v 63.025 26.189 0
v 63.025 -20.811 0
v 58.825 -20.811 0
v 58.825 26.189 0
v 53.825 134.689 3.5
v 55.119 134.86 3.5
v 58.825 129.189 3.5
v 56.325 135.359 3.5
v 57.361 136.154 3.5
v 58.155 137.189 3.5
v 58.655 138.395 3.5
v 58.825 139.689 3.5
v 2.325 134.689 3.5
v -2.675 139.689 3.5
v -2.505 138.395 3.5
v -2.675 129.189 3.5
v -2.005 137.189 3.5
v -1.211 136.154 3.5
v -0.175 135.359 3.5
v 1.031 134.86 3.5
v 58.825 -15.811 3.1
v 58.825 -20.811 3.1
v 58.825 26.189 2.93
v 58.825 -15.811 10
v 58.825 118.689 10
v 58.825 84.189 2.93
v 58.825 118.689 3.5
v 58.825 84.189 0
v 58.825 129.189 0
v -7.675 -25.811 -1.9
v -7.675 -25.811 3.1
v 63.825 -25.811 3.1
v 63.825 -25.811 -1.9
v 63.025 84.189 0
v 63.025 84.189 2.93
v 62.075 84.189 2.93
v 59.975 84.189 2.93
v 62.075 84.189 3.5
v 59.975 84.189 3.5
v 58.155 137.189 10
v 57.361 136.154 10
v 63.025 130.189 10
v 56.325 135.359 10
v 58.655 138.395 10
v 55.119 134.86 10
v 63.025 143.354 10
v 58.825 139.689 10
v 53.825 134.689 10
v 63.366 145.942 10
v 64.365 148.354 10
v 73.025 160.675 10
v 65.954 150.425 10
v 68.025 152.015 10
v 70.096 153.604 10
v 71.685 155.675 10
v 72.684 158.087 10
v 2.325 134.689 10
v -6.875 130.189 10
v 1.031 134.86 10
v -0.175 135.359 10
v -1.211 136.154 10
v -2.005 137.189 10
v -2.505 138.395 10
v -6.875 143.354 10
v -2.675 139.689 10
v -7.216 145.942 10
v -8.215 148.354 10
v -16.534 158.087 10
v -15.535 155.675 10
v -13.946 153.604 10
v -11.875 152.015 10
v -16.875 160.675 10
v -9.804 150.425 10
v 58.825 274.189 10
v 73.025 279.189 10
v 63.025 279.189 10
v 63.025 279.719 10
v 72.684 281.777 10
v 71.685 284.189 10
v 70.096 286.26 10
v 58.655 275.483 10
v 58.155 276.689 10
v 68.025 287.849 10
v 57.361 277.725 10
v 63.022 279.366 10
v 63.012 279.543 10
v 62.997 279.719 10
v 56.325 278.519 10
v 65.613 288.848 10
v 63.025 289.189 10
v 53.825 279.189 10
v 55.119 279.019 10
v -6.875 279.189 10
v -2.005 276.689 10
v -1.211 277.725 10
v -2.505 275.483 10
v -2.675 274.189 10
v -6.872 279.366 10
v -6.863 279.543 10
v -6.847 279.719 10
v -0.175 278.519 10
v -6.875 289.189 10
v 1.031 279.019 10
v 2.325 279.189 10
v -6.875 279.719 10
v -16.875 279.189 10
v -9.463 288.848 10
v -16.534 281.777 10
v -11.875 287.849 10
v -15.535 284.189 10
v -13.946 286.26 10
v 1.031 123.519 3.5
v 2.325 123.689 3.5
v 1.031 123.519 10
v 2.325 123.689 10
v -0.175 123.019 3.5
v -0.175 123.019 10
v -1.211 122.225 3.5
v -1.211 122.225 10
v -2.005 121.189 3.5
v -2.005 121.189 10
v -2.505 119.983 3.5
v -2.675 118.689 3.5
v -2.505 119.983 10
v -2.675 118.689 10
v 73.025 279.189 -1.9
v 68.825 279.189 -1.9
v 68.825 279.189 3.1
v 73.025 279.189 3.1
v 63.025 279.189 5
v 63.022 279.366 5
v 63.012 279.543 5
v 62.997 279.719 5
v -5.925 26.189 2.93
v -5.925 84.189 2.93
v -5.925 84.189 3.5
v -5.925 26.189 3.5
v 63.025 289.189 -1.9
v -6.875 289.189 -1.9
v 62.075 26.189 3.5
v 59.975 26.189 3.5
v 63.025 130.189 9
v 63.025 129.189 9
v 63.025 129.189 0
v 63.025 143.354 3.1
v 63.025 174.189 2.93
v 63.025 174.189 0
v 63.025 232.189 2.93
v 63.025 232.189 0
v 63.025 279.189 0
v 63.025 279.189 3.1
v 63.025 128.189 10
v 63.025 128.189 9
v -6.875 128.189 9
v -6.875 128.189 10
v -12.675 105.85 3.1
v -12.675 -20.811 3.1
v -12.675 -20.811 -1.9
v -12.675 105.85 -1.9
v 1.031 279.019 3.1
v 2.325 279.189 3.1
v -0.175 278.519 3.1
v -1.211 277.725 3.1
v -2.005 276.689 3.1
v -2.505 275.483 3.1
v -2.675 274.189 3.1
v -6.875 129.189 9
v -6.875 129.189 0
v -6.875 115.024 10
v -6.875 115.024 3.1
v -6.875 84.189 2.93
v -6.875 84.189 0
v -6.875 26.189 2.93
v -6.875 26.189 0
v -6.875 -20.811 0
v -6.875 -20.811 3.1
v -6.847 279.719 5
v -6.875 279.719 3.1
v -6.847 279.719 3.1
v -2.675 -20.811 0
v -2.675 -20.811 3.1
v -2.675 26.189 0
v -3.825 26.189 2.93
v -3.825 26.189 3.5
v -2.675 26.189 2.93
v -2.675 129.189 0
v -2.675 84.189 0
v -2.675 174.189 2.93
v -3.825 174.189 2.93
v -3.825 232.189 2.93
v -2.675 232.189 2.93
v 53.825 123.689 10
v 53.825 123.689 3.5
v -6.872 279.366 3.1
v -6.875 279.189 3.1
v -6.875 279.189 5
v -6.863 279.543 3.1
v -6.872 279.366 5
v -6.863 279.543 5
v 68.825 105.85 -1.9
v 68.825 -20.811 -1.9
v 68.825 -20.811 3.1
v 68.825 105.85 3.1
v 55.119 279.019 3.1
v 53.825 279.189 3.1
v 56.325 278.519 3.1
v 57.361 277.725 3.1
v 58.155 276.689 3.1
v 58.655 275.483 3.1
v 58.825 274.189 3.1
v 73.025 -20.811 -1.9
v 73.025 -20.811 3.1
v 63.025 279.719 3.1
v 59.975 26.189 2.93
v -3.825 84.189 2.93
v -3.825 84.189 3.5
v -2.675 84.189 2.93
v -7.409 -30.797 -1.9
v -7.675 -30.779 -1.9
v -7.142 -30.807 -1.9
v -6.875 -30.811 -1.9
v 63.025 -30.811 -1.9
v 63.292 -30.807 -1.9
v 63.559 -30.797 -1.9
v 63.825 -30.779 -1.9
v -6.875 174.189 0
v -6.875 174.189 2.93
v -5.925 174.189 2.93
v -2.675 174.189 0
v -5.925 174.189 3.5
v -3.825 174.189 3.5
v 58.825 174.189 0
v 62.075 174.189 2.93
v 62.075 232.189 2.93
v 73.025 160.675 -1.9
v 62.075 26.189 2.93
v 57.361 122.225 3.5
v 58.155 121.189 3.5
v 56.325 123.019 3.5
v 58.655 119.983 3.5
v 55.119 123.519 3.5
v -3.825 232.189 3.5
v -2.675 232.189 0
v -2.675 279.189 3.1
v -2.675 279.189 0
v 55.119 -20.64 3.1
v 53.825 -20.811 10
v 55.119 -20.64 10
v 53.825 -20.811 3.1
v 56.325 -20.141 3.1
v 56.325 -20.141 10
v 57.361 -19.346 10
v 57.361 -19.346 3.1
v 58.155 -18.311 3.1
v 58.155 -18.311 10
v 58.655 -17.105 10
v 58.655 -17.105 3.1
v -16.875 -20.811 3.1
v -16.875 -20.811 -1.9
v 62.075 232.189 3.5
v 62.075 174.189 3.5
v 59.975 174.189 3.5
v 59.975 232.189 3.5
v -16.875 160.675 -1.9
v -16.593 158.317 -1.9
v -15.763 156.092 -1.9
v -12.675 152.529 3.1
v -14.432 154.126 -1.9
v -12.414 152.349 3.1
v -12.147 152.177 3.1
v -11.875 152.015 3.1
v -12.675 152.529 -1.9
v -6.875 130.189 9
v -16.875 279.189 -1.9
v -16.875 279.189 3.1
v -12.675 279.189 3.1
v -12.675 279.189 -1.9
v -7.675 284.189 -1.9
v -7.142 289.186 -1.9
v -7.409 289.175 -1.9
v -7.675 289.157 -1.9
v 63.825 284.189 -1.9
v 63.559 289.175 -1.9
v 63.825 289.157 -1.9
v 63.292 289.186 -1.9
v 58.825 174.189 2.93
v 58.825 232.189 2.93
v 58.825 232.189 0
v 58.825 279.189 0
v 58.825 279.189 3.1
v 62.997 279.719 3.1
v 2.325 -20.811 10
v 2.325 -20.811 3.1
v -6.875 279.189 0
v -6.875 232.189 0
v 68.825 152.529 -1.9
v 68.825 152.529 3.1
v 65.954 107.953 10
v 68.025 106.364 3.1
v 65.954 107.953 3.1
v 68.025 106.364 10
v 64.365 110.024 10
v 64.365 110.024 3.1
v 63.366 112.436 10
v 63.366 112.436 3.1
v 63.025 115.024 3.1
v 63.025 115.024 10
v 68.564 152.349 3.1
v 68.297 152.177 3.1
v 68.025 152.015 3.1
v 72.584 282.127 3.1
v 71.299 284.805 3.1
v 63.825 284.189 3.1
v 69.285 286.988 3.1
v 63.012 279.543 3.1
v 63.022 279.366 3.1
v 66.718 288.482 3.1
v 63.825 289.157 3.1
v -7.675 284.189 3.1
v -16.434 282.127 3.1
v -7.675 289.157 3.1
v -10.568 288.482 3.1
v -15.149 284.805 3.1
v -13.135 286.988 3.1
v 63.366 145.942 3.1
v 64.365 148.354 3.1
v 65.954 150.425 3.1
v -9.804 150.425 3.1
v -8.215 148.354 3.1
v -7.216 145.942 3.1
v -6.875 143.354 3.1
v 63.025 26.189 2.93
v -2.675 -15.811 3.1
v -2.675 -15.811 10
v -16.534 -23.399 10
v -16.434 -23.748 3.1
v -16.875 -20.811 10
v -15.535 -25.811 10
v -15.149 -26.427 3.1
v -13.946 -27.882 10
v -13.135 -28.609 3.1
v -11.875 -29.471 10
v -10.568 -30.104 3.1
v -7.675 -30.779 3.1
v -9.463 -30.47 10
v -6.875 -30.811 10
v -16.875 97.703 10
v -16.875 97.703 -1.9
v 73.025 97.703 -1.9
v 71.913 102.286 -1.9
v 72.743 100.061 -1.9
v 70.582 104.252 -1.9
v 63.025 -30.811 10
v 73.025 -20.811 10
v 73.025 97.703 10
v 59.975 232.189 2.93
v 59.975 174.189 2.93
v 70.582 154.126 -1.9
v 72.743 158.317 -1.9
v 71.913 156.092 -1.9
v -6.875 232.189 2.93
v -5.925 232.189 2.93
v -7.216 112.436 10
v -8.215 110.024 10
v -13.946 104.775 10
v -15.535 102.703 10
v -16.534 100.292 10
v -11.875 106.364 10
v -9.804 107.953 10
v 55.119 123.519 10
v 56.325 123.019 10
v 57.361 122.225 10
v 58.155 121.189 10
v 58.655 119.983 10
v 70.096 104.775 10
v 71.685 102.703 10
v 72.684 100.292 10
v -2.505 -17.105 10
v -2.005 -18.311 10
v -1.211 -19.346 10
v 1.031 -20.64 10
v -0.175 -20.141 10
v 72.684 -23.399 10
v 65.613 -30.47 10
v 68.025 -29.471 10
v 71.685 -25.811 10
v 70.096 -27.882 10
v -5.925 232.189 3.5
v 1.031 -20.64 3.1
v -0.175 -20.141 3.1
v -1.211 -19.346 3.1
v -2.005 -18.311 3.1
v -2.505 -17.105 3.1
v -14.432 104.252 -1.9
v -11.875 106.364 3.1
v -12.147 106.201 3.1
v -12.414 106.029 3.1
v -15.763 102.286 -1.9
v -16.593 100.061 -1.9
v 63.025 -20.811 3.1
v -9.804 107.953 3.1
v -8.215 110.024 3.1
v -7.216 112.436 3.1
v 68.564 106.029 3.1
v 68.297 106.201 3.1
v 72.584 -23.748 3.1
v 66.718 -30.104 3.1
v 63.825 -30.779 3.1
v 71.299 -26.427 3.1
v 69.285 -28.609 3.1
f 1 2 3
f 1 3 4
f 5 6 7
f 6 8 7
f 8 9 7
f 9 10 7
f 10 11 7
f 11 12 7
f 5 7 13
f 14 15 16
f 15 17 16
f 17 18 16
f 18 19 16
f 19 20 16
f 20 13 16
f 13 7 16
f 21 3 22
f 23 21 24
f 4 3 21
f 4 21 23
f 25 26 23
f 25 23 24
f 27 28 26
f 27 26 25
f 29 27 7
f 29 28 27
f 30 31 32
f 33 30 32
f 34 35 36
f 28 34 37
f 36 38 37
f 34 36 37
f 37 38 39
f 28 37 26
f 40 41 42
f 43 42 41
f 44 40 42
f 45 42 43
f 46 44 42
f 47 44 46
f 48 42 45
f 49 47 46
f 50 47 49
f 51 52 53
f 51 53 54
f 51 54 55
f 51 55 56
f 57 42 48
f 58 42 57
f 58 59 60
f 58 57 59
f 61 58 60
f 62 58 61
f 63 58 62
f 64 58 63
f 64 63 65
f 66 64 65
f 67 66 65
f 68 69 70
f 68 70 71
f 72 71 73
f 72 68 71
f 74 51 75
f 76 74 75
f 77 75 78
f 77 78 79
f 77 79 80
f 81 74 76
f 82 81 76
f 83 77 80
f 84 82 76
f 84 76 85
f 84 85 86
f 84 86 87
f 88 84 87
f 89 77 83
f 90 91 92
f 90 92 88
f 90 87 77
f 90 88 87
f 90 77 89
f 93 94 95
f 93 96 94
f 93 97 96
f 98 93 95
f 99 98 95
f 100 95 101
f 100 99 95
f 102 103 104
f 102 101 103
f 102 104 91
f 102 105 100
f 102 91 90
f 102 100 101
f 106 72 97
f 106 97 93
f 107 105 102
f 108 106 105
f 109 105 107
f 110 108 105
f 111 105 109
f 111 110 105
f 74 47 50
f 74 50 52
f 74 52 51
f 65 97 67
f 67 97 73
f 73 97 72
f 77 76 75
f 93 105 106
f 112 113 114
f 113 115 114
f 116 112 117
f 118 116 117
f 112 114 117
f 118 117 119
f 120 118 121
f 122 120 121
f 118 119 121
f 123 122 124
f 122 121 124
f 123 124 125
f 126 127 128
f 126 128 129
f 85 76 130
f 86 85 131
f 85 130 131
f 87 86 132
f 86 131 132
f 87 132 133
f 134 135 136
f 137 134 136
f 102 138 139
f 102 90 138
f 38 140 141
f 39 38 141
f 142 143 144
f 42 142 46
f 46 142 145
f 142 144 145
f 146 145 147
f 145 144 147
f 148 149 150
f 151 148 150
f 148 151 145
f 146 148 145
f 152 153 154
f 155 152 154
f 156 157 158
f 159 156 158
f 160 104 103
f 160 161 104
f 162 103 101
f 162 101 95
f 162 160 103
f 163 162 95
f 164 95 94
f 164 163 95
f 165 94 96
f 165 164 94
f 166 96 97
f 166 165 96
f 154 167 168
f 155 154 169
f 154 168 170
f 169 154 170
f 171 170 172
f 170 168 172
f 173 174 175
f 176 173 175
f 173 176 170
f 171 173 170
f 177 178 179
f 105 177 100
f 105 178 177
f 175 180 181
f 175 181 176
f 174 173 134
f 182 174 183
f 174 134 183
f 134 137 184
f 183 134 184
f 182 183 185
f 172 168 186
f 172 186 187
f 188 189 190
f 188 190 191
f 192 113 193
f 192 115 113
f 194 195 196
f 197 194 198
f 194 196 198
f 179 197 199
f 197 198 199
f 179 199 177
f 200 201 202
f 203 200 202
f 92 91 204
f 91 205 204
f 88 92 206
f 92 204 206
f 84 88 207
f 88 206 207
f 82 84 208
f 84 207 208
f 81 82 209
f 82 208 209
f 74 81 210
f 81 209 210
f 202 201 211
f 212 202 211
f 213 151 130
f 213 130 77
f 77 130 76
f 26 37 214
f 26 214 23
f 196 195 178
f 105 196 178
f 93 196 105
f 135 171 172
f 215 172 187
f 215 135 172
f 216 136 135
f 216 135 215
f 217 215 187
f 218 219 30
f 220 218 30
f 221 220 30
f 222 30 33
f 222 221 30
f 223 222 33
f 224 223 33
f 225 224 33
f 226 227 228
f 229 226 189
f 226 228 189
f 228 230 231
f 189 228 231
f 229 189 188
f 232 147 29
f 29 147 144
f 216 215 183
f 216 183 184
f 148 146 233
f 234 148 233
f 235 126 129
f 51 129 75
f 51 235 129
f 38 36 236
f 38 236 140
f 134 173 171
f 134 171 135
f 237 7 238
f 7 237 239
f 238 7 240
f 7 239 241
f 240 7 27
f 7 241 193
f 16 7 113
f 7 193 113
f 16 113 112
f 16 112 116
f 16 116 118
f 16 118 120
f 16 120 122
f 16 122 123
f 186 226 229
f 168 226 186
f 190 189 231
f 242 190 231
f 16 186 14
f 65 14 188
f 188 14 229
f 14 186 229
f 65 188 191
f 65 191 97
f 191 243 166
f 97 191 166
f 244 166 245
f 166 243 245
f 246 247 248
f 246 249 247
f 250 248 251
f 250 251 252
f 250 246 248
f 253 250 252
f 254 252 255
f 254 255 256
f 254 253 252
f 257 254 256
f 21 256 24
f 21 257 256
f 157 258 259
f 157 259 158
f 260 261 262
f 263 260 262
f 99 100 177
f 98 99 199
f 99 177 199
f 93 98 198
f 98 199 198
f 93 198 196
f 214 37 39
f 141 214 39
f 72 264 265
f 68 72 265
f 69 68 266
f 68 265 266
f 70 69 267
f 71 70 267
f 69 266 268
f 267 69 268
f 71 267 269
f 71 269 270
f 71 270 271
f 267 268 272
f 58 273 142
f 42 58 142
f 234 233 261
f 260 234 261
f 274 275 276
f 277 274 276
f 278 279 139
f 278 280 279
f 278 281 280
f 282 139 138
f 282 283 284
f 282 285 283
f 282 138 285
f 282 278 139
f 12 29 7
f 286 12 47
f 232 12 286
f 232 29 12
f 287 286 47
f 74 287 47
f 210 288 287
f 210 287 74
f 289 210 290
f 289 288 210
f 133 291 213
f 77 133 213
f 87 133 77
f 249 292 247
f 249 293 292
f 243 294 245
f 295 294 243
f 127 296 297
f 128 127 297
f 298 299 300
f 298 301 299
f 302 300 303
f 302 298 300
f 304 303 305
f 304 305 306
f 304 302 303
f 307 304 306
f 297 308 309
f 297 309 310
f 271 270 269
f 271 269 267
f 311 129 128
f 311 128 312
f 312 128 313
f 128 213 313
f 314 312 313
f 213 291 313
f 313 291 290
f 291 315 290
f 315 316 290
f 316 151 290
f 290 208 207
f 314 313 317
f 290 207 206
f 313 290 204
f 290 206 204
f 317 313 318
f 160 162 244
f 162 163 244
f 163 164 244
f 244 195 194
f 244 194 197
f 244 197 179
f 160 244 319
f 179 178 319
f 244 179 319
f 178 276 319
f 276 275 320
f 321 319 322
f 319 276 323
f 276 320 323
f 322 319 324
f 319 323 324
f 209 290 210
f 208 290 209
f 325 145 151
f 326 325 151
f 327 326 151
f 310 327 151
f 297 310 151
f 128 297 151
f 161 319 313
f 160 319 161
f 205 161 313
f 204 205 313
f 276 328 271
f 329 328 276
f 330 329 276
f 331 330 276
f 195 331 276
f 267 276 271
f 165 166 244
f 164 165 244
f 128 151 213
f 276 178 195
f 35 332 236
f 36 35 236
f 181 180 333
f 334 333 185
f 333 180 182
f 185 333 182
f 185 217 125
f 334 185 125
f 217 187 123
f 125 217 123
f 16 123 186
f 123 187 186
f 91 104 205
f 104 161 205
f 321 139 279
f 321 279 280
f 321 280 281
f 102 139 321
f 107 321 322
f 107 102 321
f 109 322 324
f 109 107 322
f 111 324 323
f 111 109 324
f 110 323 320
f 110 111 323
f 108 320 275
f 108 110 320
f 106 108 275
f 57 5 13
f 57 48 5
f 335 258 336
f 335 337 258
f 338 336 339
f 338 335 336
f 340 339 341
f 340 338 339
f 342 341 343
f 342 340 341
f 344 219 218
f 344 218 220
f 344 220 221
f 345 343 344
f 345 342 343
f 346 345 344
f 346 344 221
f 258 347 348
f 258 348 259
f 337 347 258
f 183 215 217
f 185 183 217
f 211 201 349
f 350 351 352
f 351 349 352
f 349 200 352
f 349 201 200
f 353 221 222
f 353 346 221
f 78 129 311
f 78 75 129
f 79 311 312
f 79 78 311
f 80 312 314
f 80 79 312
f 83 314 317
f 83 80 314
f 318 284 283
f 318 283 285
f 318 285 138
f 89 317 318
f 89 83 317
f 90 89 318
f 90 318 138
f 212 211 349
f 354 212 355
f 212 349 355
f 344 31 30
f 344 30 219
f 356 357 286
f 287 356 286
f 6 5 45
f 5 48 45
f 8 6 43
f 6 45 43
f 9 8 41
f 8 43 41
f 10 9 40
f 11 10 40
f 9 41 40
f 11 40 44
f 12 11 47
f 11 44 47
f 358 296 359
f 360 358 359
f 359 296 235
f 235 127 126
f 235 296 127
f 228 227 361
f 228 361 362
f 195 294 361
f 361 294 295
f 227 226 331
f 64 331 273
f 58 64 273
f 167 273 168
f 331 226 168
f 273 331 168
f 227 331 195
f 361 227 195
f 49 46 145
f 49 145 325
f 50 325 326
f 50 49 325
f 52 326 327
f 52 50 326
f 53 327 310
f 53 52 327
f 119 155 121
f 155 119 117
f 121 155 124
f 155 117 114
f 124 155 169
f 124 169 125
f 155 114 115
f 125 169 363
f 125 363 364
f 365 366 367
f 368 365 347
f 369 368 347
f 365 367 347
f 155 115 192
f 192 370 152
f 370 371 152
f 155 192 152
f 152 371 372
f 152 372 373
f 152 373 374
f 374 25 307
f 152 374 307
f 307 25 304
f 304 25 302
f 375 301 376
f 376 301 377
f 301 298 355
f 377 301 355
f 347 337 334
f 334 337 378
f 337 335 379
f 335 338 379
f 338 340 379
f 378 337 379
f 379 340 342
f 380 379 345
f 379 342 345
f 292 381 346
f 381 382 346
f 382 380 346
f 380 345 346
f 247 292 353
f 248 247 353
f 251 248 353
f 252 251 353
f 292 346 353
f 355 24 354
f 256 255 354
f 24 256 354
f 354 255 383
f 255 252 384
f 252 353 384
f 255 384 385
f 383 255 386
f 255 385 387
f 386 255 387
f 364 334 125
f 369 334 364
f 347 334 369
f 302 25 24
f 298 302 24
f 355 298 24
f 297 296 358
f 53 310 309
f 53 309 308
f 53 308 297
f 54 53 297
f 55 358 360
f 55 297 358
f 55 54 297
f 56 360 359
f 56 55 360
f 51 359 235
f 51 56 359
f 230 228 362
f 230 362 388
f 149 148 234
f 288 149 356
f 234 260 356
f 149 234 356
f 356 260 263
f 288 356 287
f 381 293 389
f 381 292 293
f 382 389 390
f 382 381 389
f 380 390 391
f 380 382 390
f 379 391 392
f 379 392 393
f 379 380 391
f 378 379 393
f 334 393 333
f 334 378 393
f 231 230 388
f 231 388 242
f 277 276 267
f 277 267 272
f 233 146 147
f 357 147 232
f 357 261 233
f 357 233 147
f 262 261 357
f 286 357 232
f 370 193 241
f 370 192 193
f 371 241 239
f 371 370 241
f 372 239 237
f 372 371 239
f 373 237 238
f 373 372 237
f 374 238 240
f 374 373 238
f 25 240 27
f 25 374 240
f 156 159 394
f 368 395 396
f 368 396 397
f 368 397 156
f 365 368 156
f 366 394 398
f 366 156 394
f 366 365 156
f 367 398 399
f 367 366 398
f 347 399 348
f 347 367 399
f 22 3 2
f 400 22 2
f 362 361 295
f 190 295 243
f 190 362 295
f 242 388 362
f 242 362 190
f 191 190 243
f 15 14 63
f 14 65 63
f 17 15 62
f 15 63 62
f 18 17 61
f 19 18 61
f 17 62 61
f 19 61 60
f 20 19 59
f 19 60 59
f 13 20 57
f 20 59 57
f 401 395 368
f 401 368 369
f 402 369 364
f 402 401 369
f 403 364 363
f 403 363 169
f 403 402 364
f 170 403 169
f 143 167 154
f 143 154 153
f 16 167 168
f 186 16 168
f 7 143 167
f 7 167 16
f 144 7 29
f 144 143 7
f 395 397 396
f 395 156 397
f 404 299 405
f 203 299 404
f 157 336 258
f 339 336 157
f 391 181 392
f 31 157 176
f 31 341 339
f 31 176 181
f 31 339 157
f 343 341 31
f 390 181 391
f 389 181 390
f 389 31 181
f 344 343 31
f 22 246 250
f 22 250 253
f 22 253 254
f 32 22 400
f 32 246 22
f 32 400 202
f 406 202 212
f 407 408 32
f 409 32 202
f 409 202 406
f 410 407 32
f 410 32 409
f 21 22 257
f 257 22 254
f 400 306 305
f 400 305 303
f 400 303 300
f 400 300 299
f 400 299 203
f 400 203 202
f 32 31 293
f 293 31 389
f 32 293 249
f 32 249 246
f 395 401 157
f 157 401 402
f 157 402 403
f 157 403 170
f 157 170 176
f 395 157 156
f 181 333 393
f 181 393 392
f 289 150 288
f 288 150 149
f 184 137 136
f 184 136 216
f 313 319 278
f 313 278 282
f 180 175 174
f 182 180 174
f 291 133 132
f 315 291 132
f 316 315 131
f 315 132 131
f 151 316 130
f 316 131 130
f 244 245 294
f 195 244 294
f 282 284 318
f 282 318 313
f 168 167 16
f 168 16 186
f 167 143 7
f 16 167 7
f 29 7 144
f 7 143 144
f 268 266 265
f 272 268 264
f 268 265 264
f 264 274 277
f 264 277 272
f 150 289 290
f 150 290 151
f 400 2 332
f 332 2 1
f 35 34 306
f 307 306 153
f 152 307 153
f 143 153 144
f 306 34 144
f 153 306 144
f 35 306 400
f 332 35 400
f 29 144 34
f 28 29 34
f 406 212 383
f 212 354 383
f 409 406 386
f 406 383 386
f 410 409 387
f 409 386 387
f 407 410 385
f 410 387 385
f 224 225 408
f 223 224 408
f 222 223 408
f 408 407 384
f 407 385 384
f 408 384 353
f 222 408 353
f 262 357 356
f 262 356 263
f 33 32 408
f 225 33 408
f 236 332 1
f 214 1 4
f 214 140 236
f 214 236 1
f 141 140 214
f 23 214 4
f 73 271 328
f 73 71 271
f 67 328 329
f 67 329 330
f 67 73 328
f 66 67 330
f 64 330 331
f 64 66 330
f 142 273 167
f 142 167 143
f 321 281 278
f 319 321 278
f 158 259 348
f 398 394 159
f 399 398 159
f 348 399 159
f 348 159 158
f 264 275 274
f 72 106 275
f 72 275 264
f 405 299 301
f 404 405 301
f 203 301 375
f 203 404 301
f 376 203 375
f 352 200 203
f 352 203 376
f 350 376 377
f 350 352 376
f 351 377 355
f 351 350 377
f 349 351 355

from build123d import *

# Parameters (mm, degrees)
SKETCH1_W            = 300
SKETCH1_H            = 4.2
BOSS_EXTRUDE1_DEPTH  = 5
SKETCH3_W            = 4.2
SKETCH3_H            = 58
CUT_EXTRUDE1_DEPTH   = 280.318535117
SKETCH4_W            = 2.1
SKETCH4_H            = 1.5
SKETCH4_W_2          = 1.15
SKETCH4_H_2          = 0.57
BOSS_EXTRUDE2_DEPTH  = 58
SKETCH5_W            = 4.2
SKETCH5_H            = 1.9
BOSS_EXTRUDE3_DEPTH  = 5
SKETCH6_W            = 5
SKETCH6_H            = 1.9
BOSS_EXTRUDE4_DEPTH  = 63
SKETCH7_W            = 5
SKETCH7_H            = 1.9
BOSS_EXTRUDE5_DEPTH  = 63
SKETCH8_W            = 5
SKETCH8_H            = 1.5
BOSS_EXTRUDE6_DEPTH  = 63
FILLET1_R            = 5
SKETCH9_W            = 69.9
SKETCH9_H            = 2
CUT_EXTRUDE2_DEPTH   = 1
SKETCH11_W           = 61.5
SKETCH11_H           = 147.5
BOSS_EXTRUDE8_DEPTH  = 5
SKETCH12_W           = 69.9
SKETCH12_H           = 2
BOSS_EXTRUDE9_DEPTH  = 5
SKETCH13_W           = 61.5
SKETCH13_H           = 147.5
BOSS_EXTRUDE10_DEPTH = 5
SKETCH15_W           = 125.83484861
SKETCH15_H           = 6.9
BOSS_EXTRUDE11_DEPTH = 10
SKETCH16_W           = 125.83484861
SKETCH16_H           = 6.9
BOSS_EXTRUDE12_DEPTH = 10
SKETCH17_W           = 10
SKETCH17_H           = 6.9
BOSS_EXTRUDE13_DEPTH = 5
BOSS_EXTRUDE14_REACH = 297.377
SKETCH18_W           = 4.47029548
SKETCH18_H           = 6.9
SKETCH19_W           = 10
SKETCH19_H           = 6.9
BOSS_EXTRUDE15_DEPTH = 5
SKETCH20_W           = 5
SKETCH20_H           = 6.9
BOSS_EXTRUDE16_DEPTH = 79.9
SKETCH21_W           = 89.9
SKETCH21_H           = 6.9
BOSS_EXTRUDE17_DEPTH = 5
SKETCH22_W           = 89.9
SKETCH22_H           = 6.9
BOSS_EXTRUDE18_DEPTH = 5
SKETCH23_W           = 4.2
SKETCH23_H           = 125.83484861
SKETCH23_W_2         = 71.5
SKETCH23_H_2         = 5
BOSS_EXTRUDE19_DEPTH = 5
SKETCH24_W           = 4.2
SKETCH24_H           = 125.83484861
SKETCH24_W_2         = 71.5
SKETCH24_H_2         = 5
BOSS_EXTRUDE20_DEPTH = 5
FILLET2_R            = 10
FILLET3_R            = 10
FILLET4_R            = 10
SKETCH25_W           = 61.5
SKETCH25_H           = 6.5
BOSS_EXTRUDE21_DEPTH = 3
SKETCH26_W           = 61.5
SKETCH26_H           = 6.5
BOSS_EXTRUDE22_DEPTH = 3
FILLET5_R            = 5


with BuildPart() as part:
    # Sketch1 → Boss-Extrude1 (new body)
    with BuildSketch(Plane(origin=(0, 0, 0), x_dir=(0, 1, 0), z_dir=(0, 0, 1))):
        with Locations((129.189144184, 4.775014868)):
            Rectangle(SKETCH1_W, SKETCH1_H)
    extrude(amount=BOSS_EXTRUDE1_DEPTH)

    # Sketch3 → Cut-Extrude1 (cut, through all)
    with BuildSketch(Plane.XY.offset(5)):
        with Locations((-4.775014868, 55.189144184)):
            Rectangle(SKETCH3_W, SKETCH3_H)
    extrude(amount=-CUT_EXTRUDE1_DEPTH, mode=Mode.SUBTRACT)


with BuildPart() as cut_extrude1_piece_1:
    # of the separate pieces the step leaves, piece 1, a body of its own (cut_extrude1_pieces)
    add(part.part.solids().sort_by_distance((-6.875014868, 84.189144184, 0))[0])



with BuildPart() as cut_extrude1_piece_2:
    # of the separate pieces the step leaves, piece 2, a body of its own (cut_extrude1_pieces)
    add(part.part.solids().sort_by_distance((-6.875014868, -20.810855816, 0))[0])


with BuildPart() as cut_extrude1_piece_1_1:
    add(cut_extrude1_piece_1.part)

    add(cut_extrude1_piece_2.part)  # Boss-Extrude2 merges Cut-Extrude1 piece 2
    # Sketch4 → Boss-Extrude2 (add)
    with BuildSketch(Plane.XZ.offset(-84.189144184)):
        Polygon((-5.925014868, 5), (-6.875014868, 5), (-6.875014868, 2.93), (-5.925014868, 2.93), (-5.925014868, 3.5), align=None)
        with Locations((-4.875014868, 4.25)):
            Rectangle(SKETCH4_W, SKETCH4_H)
        with Locations((-3.250014868, 4.25)):
            Rectangle(SKETCH4_W_2, SKETCH4_H)
        with Locations((-3.250014868, 3.215)):
            Rectangle(SKETCH4_W_2, SKETCH4_H_2)
    extrude(amount=BOSS_EXTRUDE2_DEPTH)

    # Split1
    split(bisect_by=Plane(origin=(0, 129.189144184, 0), x_dir=(1, 0, 0), z_dir=(0, 1, 0)), keep=Keep.BOTTOM)

    # Sketch5 → Boss-Extrude3 (add)
    with BuildSketch(Plane.XZ.offset(20.810855816)):
        with Locations((-4.775014868, 4.05)):
            Rectangle(SKETCH5_W, SKETCH5_H)
    extrude(amount=BOSS_EXTRUDE3_DEPTH)

    # Mirror1: Cut-Extrude1 piece 1 across plane


with BuildPart() as cut_extrude1_piece_1_2:
    add(cut_extrude1_piece_1_1.part)
    add(cut_extrude1_piece_1_1.part.mirror(Plane.ZX.offset(129.189144184)))


with BuildPart() as body_2:
    # Mirror4: mirrored copy
    add(cut_extrude1_piece_1_2.part.mirror(Plane.ZY.offset(-28.074985132)))


with BuildPart() as cut_extrude1_piece_1_3:
    add(cut_extrude1_piece_1_2.part)

    add(body_2.part)  # Boss-Extrude4 merges body 2
    # Sketch6 → Boss-Extrude4 (add)
    with BuildSketch(Plane.YZ.offset(-2.675014868)):
        with Locations((-23.310855816, 4.05)):
            Rectangle(SKETCH6_W, SKETCH6_H)
    extrude(amount=BOSS_EXTRUDE4_DEPTH)

    # Sketch7 → Boss-Extrude5 (add)
    with BuildSketch(Plane.YZ.offset(-2.675014868)):
        with Locations((281.689144184, 4.05)):
            Rectangle(SKETCH7_W, SKETCH7_H)
    extrude(amount=BOSS_EXTRUDE5_DEPTH)

    # Sketch8 → Boss-Extrude6 (add)
    with BuildSketch(Plane.YZ.offset(-2.675014868)):
        with Locations((129.189144184, 4.25)):
            Rectangle(SKETCH8_W, SKETCH8_H)
    extrude(amount=BOSS_EXTRUDE6_DEPTH)

    # Fillet1
    fillet1_edges = [cut_extrude1_piece_1_3.edges().sort_by_distance(p)[0] for p in [
        (63.024985132, 284.189144184, 4.05),
        (-6.875014868, -25.810855816, 4.05),
        (-6.875014868, 284.189144184, 4.05),
        (63.024985132, -25.810855816, 4.05),
    ]]
    fillet(fillet1_edges, radius=FILLET1_R)

    # Sketch9 → Cut-Extrude2 (cut)
    with BuildSketch(Plane.XY.offset(5)):
        with Locations((28.074985132, 129.189144184)):
            Rectangle(SKETCH9_W, SKETCH9_H)
    extrude(amount=-CUT_EXTRUDE2_DEPTH, mode=Mode.SUBTRACT)

    # Sketch11 → Boss-Extrude8 (add)
    with BuildSketch(Plane.XY.offset(5)):
        with BuildLine():
            Line((58.024985132, 284.189144184), (-1.875014868, 284.189144184))
            ThreePointArc((-1.875014868, 284.189144184), (-5.410548774, 282.72467809), (-6.875014868, 279.189144184))
            Line((-6.875014868, 279.189144184), (-6.875014868, 130.189144184))
            Line((-6.875014868, 130.189144184), (63.024985132, 130.189144184))
            Line((63.024985132, 130.189144184), (63.024985132, 279.189144184))
            ThreePointArc((63.024985132, 279.189144184), (61.560519038, 282.72467809), (58.024985132, 284.189144184))
        make_face()
        with Locations((28.074985132, 205.439144184)):
            Rectangle(SKETCH11_W, SKETCH11_H, mode=Mode.SUBTRACT)
    extrude(amount=BOSS_EXTRUDE8_DEPTH)

    # Sketch12 → Boss-Extrude9 (add)
    with BuildSketch(Plane.XY.offset(4)):
        with Locations((28.074985132, 129.189144184)):
            Rectangle(SKETCH12_W, SKETCH12_H)
    extrude(amount=BOSS_EXTRUDE9_DEPTH)

    # Sketch13 → Boss-Extrude10 (add)
    with BuildSketch(Plane.XY.offset(5)):
        with BuildLine():
            Line((63.024985132, -20.810855816), (63.024985132, 128.189144184))
            Line((63.024985132, 128.189144184), (-6.875014868, 128.189144184))
            Line((-6.875014868, 128.189144184), (-6.875014868, -20.810855816))
            ThreePointArc((-6.875014868, -20.810855816), (-5.410548774, -24.346389722), (-1.875014868, -25.810855816))
            Line((-1.875014868, -25.810855816), (58.024985132, -25.810855816))
            ThreePointArc((58.024985132, -25.810855816), (61.560519038, -24.346389722), (63.024985132, -20.810855816))
        make_face()
        with Locations((28.074985132, 52.939144184)):
            Rectangle(SKETCH13_W, SKETCH13_H, mode=Mode.SUBTRACT)
    extrude(amount=BOSS_EXTRUDE10_DEPTH)

    # Sketch15 → Boss-Extrude11 (add)
    with BuildSketch(Plane.YZ.offset(63.024985132)):
        with Locations((216.271719879, 6.55)):
            Rectangle(SKETCH15_W, SKETCH15_H)
        with Locations((42.106568489, 6.55)):
            Rectangle(SKETCH15_W, SKETCH15_H)
    extrude(amount=BOSS_EXTRUDE11_DEPTH)

    # Sketch16 → Boss-Extrude12 (add)
    with BuildSketch(Plane(origin=(-6.875014868, 0, 0), x_dir=(0, -1, 0), z_dir=(-1, 0, 0))):
        with Locations((-216.271719879, 6.55)):
            Rectangle(SKETCH16_W, SKETCH16_H)
        with Locations((-42.106568489, 6.55)):
            Rectangle(SKETCH16_W, SKETCH16_H)
    extrude(amount=BOSS_EXTRUDE12_DEPTH)

    # Sketch17 → Boss-Extrude13 (add)
    with BuildSketch(Plane(origin=(0, 279.189144184, 0), x_dir=(-1, 0, 0), z_dir=(0, 1, 0))):
        with Locations((11.875014868, 6.55)):
            Rectangle(SKETCH17_W, SKETCH17_H)
        with Locations((-68.024985132, 6.55)):
            Rectangle(SKETCH17_W, SKETCH17_H)
    extrude(amount=BOSS_EXTRUDE13_DEPTH)

    # Boss-Extrude14: up to this face of the body (flat: up to its plane)
    boss_extrude14_end = Plane(cut_extrude1_piece_1_3.part.faces().sort_by_distance((63.024985132, 281.689144184, 6.55))[0])
    # Sketch18 → Boss-Extrude14 (add, up to the picked face)
    with BuildSketch(Plane.YZ.offset(-6.875014868), mode=Mode.PRIVATE) as boss_extrude14_sk1:
        with Locations((281.953996444, 6.55)):
            Rectangle(SKETCH18_W, SKETCH18_H)
    boss_extrude14_tool1 = split(extrude(boss_extrude14_sk1.sketch, amount=BOSS_EXTRUDE14_REACH, mode=Mode.PRIVATE), bisect_by=boss_extrude14_end, keep=Keep.BOTH, mode=Mode.PRIVATE)
    add(boss_extrude14_tool1.solids().sort_by(Axis((-6.875015, 281.953996, 6.55), (1, 0, 0)))[0])

    # Sketch19 → Boss-Extrude15 (add)
    with BuildSketch(Plane.XZ.offset(20.810855816)):
        with Locations((68.024985132, 6.55)):
            Rectangle(SKETCH19_W, SKETCH19_H)
    extrude(amount=BOSS_EXTRUDE15_DEPTH)

    # Sketch20 → Boss-Extrude16 (add)
    with BuildSketch(Plane(origin=(63.024985132, 0, 0), x_dir=(0, -1, 0), z_dir=(-1, 0, 0))):
        with Locations((23.310855816, 6.55)):
            Rectangle(SKETCH20_W, SKETCH20_H)
    extrude(amount=BOSS_EXTRUDE16_DEPTH)

    # Sketch21 → Boss-Extrude17 (add)
    with BuildSketch(Plane.XZ.offset(25.810855816)):
        with Locations((28.074985132, 6.55)):
            Rectangle(SKETCH21_W, SKETCH21_H)
    extrude(amount=BOSS_EXTRUDE17_DEPTH)

    # Sketch22 → Boss-Extrude18 (add)
    with BuildSketch(Plane(origin=(0, 284.189144184, 0), x_dir=(-1, 0, 0), z_dir=(0, 1, 0))):
        with Locations((-28.074985132, 6.55)):
            Rectangle(SKETCH22_W, SKETCH22_H)
    extrude(amount=BOSS_EXTRUDE18_DEPTH)

    # Sketch23 → Boss-Extrude19 (add)
    with BuildSketch(Plane(origin=(0, 0, 3.1), x_dir=(1, 0, 0), z_dir=(0, 0, -1))):
        with Locations((-14.775014868, -216.271719879)):
            Rectangle(SKETCH23_W, SKETCH23_H)
        with Locations((28.074985132, -286.689144184)):
            Rectangle(SKETCH23_W_2, SKETCH23_H_2)
        with Locations((70.924985132, -216.271719879)):
            Rectangle(SKETCH23_W, SKETCH23_H)
    extrude(amount=BOSS_EXTRUDE19_DEPTH)

    # Sketch24 → Boss-Extrude20 (add)
    with BuildSketch(Plane(origin=(0, 0, 3.1), x_dir=(1, 0, 0), z_dir=(0, 0, -1))):
        with Locations((-14.775014868, -42.106568489)):
            Rectangle(SKETCH24_W, SKETCH24_H)
        with Locations((70.924985132, -42.106568489)):
            Rectangle(SKETCH24_W, SKETCH24_H)
        with Locations((28.074985132, 28.310855816)):
            Rectangle(SKETCH24_W_2, SKETCH24_H_2)
    extrude(amount=BOSS_EXTRUDE20_DEPTH)

    # Fillet2
    fillet2_edges = [cut_extrude1_piece_1_3.edges().sort_by_distance(p)[0] for p in [
        (-16.875014868, 289.189144184, 6.55),
        (73.024985132, 289.189144184, 6.55),
        (-16.875014868, -30.810855816, 6.55),
        (73.024985132, -30.810855816, 6.55),
    ]]
    fillet(fillet2_edges, radius=FILLET2_R)

    # Fillet3
    # the kernel refuses this fillet: 10 mm, written as the material it adds along each edge
    with BuildSketch(Plane(origin=(63.024985132, 105.023992794, 10), x_dir=(1, 0, 0), z_dir=(0, 0, -1))) as fillet3_piece_1_section:
        with BuildLine():
            CenterArc((FILLET3_R, -FILLET3_R), FILLET3_R, 90, 90)
            Line((0, -FILLET3_R), (0, 0))
            Line((0, 0), (FILLET3_R, 0))
        make_face()
    fillet3_piece_1 = extrude(amount=6.9, mode=Mode.PRIVATE)
    fillet3_piece_1 = split(fillet3_piece_1, bisect_by=Plane(origin=(68.824985132, 105.149733209, 6.55), z_dir=(1, 0, 0)), keep=Keep.TOP, mode=Mode.PRIVATE)
    add(fillet3_piece_1)
    with BuildSketch(Plane(origin=(63.024985132, 105.023992794, 10), x_dir=(1, 0, 0), z_dir=(0, 0, -1))) as fillet3_piece_2_section:
        with BuildLine():
            CenterArc((FILLET3_R, -FILLET3_R), FILLET3_R, 90, 90)
            Line((0, -FILLET3_R), (0, 0))
            Line((0, 0), (FILLET3_R, 0))
        make_face()
    fillet3_piece_2 = extrude(amount=6.9, mode=Mode.PRIVATE)
    fillet3_piece_2 = split(fillet3_piece_2, bisect_by=Plane(origin=(68.824985132, 107.480802197, 6.55), z_dir=(-1, 0, 0)), keep=Keep.TOP, mode=Mode.PRIVATE)
    add(fillet3_piece_2)
    with BuildSketch(Plane(origin=(63.024985132, 105.023992794, 10), x_dir=(1, 0, 0), z_dir=(0, 0, -1))) as fillet3_piece_3_section:
        with BuildLine():
            CenterArc((FILLET3_R, -FILLET3_R), FILLET3_R, 90, 90)
            Line((0, -FILLET3_R), (0, 0))
            Line((0, 0), (FILLET3_R, 0))
        make_face()
    fillet3_piece_3 = extrude(amount=31.9, mode=Mode.PRIVATE)
    fillet3_piece_3 = split(fillet3_piece_3, bisect_by=Plane(origin=(70.287056522, 105.149733209, 3.1), z_dir=(0, 0, -1)), keep=Keep.TOP, mode=Mode.PRIVATE)
    fillet3_piece_3 = split(fillet3_piece_3, bisect_by=Plane(origin=(68.824985132, 105.149733209, 1.55), z_dir=(1, 0, 0)), keep=Keep.TOP, mode=Mode.PRIVATE)
    fillet3_piece_3 = split(fillet3_piece_3, bisect_by=Plane(origin=(70.287056522, 105.149733209, 0), z_dir=(0, 0, 1)), keep=Keep.TOP, mode=Mode.PRIVATE)
    add(fillet3_piece_3)
    with BuildSketch(Plane(origin=(63.024985132, 105.023992794, 10), x_dir=(1, 0, 0), z_dir=(0, 0, -1))) as fillet3_piece_4_section:
        with BuildLine():
            CenterArc((FILLET3_R, -FILLET3_R), FILLET3_R, 90, 90)
            Line((0, -FILLET3_R), (0, 0))
            Line((0, 0), (FILLET3_R, 0))
        make_face()
    fillet3_piece_4 = extrude(amount=31.9, mode=Mode.PRIVATE)
    fillet3_piece_4 = split(fillet3_piece_4, bisect_by=Plane(origin=(68.824985132, 105.149733209, -0.95), z_dir=(1, 0, 0)), keep=Keep.TOP, mode=Mode.PRIVATE)
    fillet3_piece_4 = split(fillet3_piece_4, bisect_by=Plane(origin=(70.287056522, 105.149733209, -1.9), z_dir=(0, 0, 1)), keep=Keep.TOP, mode=Mode.PRIVATE)
    fillet3_piece_4 = split(fillet3_piece_4, bisect_by=Plane(origin=(70.287056522, 105.149733209, 0), z_dir=(0, 0, -1)), keep=Keep.TOP, mode=Mode.PRIVATE)
    add(fillet3_piece_4)
    with BuildSketch(Plane(origin=(63.024985132, 153.354295574, 10), x_dir=(0, -1, 0), z_dir=(0, 0, -1))) as fillet3_piece_5_section:
        with BuildLine():
            CenterArc((FILLET3_R, -FILLET3_R), FILLET3_R, 90, 90)
            Line((0, -FILLET3_R), (0, 0))
            Line((0, 0), (FILLET3_R, 0))
        make_face()
    fillet3_piece_5 = extrude(amount=6.9, mode=Mode.PRIVATE)
    fillet3_piece_5 = split(fillet3_piece_5, bisect_by=Plane(origin=(68.824985132, 150.897486171, 6.55), z_dir=(-1, 0, 0)), keep=Keep.TOP, mode=Mode.PRIVATE)
    add(fillet3_piece_5)
    with BuildSketch(Plane(origin=(63.024985132, 153.354295574, 10), x_dir=(0, -1, 0), z_dir=(0, 0, -1))) as fillet3_piece_6_section:
        with BuildLine():
            CenterArc((FILLET3_R, -FILLET3_R), FILLET3_R, 90, 90)
            Line((0, -FILLET3_R), (0, 0))
            Line((0, 0), (FILLET3_R, 0))
        make_face()
    fillet3_piece_6 = extrude(amount=6.9, mode=Mode.PRIVATE)
    fillet3_piece_6 = split(fillet3_piece_6, bisect_by=Plane(origin=(68.824985132, 153.22855516, 6.55), z_dir=(1, 0, 0)), keep=Keep.TOP, mode=Mode.PRIVATE)
    add(fillet3_piece_6)
    with BuildSketch(Plane(origin=(63.024985132, 153.354295574, 10), x_dir=(0, -1, 0), z_dir=(0, 0, -1))) as fillet3_piece_7_section:
        with BuildLine():
            CenterArc((FILLET3_R, -FILLET3_R), FILLET3_R, 90, 90)
            Line((0, -FILLET3_R), (0, 0))
            Line((0, 0), (FILLET3_R, 0))
        make_face()
    fillet3_piece_7 = extrude(amount=31.9, mode=Mode.PRIVATE)
    fillet3_piece_7 = split(fillet3_piece_7, bisect_by=Plane(origin=(70.287056522, 153.22855516, 0), z_dir=(0, 0, 1)), keep=Keep.TOP, mode=Mode.PRIVATE)
    fillet3_piece_7 = split(fillet3_piece_7, bisect_by=Plane(origin=(70.287056522, 153.22855516, 3.1), z_dir=(0, 0, -1)), keep=Keep.TOP, mode=Mode.PRIVATE)
    fillet3_piece_7 = split(fillet3_piece_7, bisect_by=Plane(origin=(68.824985132, 153.22855516, 1.55), z_dir=(1, 0, 0)), keep=Keep.TOP, mode=Mode.PRIVATE)
    add(fillet3_piece_7)
    with BuildSketch(Plane(origin=(63.024985132, 153.354295574, 10), x_dir=(0, -1, 0), z_dir=(0, 0, -1))) as fillet3_piece_8_section:
        with BuildLine():
            CenterArc((FILLET3_R, -FILLET3_R), FILLET3_R, 90, 90)
            Line((0, -FILLET3_R), (0, 0))
            Line((0, 0), (FILLET3_R, 0))
        make_face()
    fillet3_piece_8 = extrude(amount=31.9, mode=Mode.PRIVATE)
    fillet3_piece_8 = split(fillet3_piece_8, bisect_by=Plane(origin=(70.287056522, 153.22855516, 0), z_dir=(0, 0, -1)), keep=Keep.TOP, mode=Mode.PRIVATE)
    fillet3_piece_8 = split(fillet3_piece_8, bisect_by=Plane(origin=(70.287056522, 153.22855516, -1.9), z_dir=(0, 0, 1)), keep=Keep.TOP, mode=Mode.PRIVATE)
    fillet3_piece_8 = split(fillet3_piece_8, bisect_by=Plane(origin=(68.824985132, 153.22855516, -0.95), z_dir=(1, 0, 0)), keep=Keep.TOP, mode=Mode.PRIVATE)
    add(fillet3_piece_8)
    with BuildSketch(Plane(origin=(-6.875014868, 153.354295574, 10), x_dir=(0, -1, 0), z_dir=(0, 0, -1))) as fillet3_piece_9_section:
        with BuildLine():
            CenterArc((FILLET3_R, FILLET3_R), FILLET3_R, 180, 90)
            Line((0, FILLET3_R), (0, 0))
            Line((0, 0), (FILLET3_R, 0))
        make_face()
    fillet3_piece_9 = extrude(amount=6.9, mode=Mode.PRIVATE)
    fillet3_piece_9 = split(fillet3_piece_9, bisect_by=Plane(origin=(-12.675014868, 150.897486171, 6.55), z_dir=(1, 0, 0)), keep=Keep.TOP, mode=Mode.PRIVATE)
    add(fillet3_piece_9)
    with BuildSketch(Plane(origin=(-6.875014868, 153.354295574, 10), x_dir=(0, -1, 0), z_dir=(0, 0, -1))) as fillet3_piece_10_section:
        with BuildLine():
            CenterArc((FILLET3_R, FILLET3_R), FILLET3_R, 180, 90)
            Line((0, FILLET3_R), (0, 0))
            Line((0, 0), (FILLET3_R, 0))
        make_face()
    fillet3_piece_10 = extrude(amount=6.9, mode=Mode.PRIVATE)
    fillet3_piece_10 = split(fillet3_piece_10, bisect_by=Plane(origin=(-12.675014868, 153.22855516, 6.55), z_dir=(-1, 0, 0)), keep=Keep.TOP, mode=Mode.PRIVATE)
    add(fillet3_piece_10)
    with BuildSketch(Plane(origin=(-6.875014868, 153.354295574, 10), x_dir=(0, -1, 0), z_dir=(0, 0, -1))) as fillet3_piece_11_section:
        with BuildLine():
            CenterArc((FILLET3_R, FILLET3_R), FILLET3_R, 180, 90)
            Line((0, FILLET3_R), (0, 0))
            Line((0, 0), (FILLET3_R, 0))
        make_face()
    fillet3_piece_11 = extrude(amount=31.9, mode=Mode.PRIVATE)
    fillet3_piece_11 = split(fillet3_piece_11, bisect_by=Plane(origin=(-14.137086257, 153.22855516, 0), z_dir=(0, 0, 1)), keep=Keep.TOP, mode=Mode.PRIVATE)
    fillet3_piece_11 = split(fillet3_piece_11, bisect_by=Plane(origin=(-14.137086257, 153.22855516, 3.1), z_dir=(0, 0, -1)), keep=Keep.TOP, mode=Mode.PRIVATE)
    fillet3_piece_11 = split(fillet3_piece_11, bisect_by=Plane(origin=(-12.675014868, 153.22855516, 1.55), z_dir=(-1, 0, 0)), keep=Keep.TOP, mode=Mode.PRIVATE)
    add(fillet3_piece_11)
    with BuildSketch(Plane(origin=(-6.875014868, 153.354295574, 10), x_dir=(0, -1, 0), z_dir=(0, 0, -1))) as fillet3_piece_12_section:
        with BuildLine():
            CenterArc((FILLET3_R, FILLET3_R), FILLET3_R, 180, 90)
            Line((0, FILLET3_R), (0, 0))
            Line((0, 0), (FILLET3_R, 0))
        make_face()
    fillet3_piece_12 = extrude(amount=31.9, mode=Mode.PRIVATE)
    fillet3_piece_12 = split(fillet3_piece_12, bisect_by=Plane(origin=(-14.137086257, 153.22855516, 0), z_dir=(0, 0, -1)), keep=Keep.TOP, mode=Mode.PRIVATE)
    fillet3_piece_12 = split(fillet3_piece_12, bisect_by=Plane(origin=(-14.137086257, 153.22855516, -1.9), z_dir=(0, 0, 1)), keep=Keep.TOP, mode=Mode.PRIVATE)
    fillet3_piece_12 = split(fillet3_piece_12, bisect_by=Plane(origin=(-12.675014868, 153.22855516, -0.95), z_dir=(-1, 0, 0)), keep=Keep.TOP, mode=Mode.PRIVATE)
    add(fillet3_piece_12)
    with BuildSketch(Plane(origin=(-6.875014868, 105.023992794, -21.9), x_dir=(-1, 0, 0), z_dir=(0, 0, 1))) as fillet3_piece_13_section:
        with BuildLine():
            CenterArc((FILLET3_R, -FILLET3_R), FILLET3_R, 90, 90)
            Line((0, -FILLET3_R), (0, 0))
            Line((0, 0), (FILLET3_R, 0))
        make_face()
    fillet3_piece_13 = extrude(amount=31.9, mode=Mode.PRIVATE)
    fillet3_piece_13 = split(fillet3_piece_13, bisect_by=Plane(origin=(-12.675014868, 105.149733209, -0.95), z_dir=(-1, 0, 0)), keep=Keep.TOP, mode=Mode.PRIVATE)
    fillet3_piece_13 = split(fillet3_piece_13, bisect_by=Plane(origin=(-14.137086257, 105.149733209, -1.9), z_dir=(0, 0, 1)), keep=Keep.TOP, mode=Mode.PRIVATE)
    fillet3_piece_13 = split(fillet3_piece_13, bisect_by=Plane(origin=(-14.137086257, 105.149733209, 0), z_dir=(0, 0, -1)), keep=Keep.TOP, mode=Mode.PRIVATE)
    add(fillet3_piece_13)
    with BuildSketch(Plane(origin=(-6.875014868, 105.023992794, -21.9), x_dir=(-1, 0, 0), z_dir=(0, 0, 1))) as fillet3_piece_14_section:
        with BuildLine():
            CenterArc((FILLET3_R, -FILLET3_R), FILLET3_R, 90, 90)
            Line((0, -FILLET3_R), (0, 0))
            Line((0, 0), (FILLET3_R, 0))
        make_face()
    fillet3_piece_14 = extrude(amount=31.9, mode=Mode.PRIVATE)
    fillet3_piece_14 = split(fillet3_piece_14, bisect_by=Plane(origin=(-14.137086257, 105.149733209, 3.1), z_dir=(0, 0, -1)), keep=Keep.TOP, mode=Mode.PRIVATE)
    fillet3_piece_14 = split(fillet3_piece_14, bisect_by=Plane(origin=(-12.675014868, 105.149733209, 1.55), z_dir=(-1, 0, 0)), keep=Keep.TOP, mode=Mode.PRIVATE)
    fillet3_piece_14 = split(fillet3_piece_14, bisect_by=Plane(origin=(-14.137086257, 105.149733209, 0), z_dir=(0, 0, 1)), keep=Keep.TOP, mode=Mode.PRIVATE)
    add(fillet3_piece_14)
    with BuildSketch(Plane(origin=(-6.875014868, 105.023992794, 3.1), x_dir=(-1, 0, 0), z_dir=(0, 0, 1))) as fillet3_piece_15_section:
        with BuildLine():
            CenterArc((FILLET3_R, -FILLET3_R), FILLET3_R, 90, 90)
            Line((0, -FILLET3_R), (0, 0))
            Line((0, 0), (FILLET3_R, 0))
        make_face()
    fillet3_piece_15 = extrude(amount=6.9, mode=Mode.PRIVATE)
    fillet3_piece_15 = split(fillet3_piece_15, bisect_by=Plane(origin=(-12.675014868, 105.149733209, 6.55), z_dir=(-1, 0, 0)), keep=Keep.TOP, mode=Mode.PRIVATE)
    add(fillet3_piece_15)
    with BuildSketch(Plane(origin=(-6.875014868, 105.023992794, 3.1), x_dir=(-1, 0, 0), z_dir=(0, 0, 1))) as fillet3_piece_16_section:
        with BuildLine():
            CenterArc((FILLET3_R, -FILLET3_R), FILLET3_R, 90, 90)
            Line((0, -FILLET3_R), (0, 0))
            Line((0, 0), (FILLET3_R, 0))
        make_face()
    fillet3_piece_16 = extrude(amount=6.9, mode=Mode.PRIVATE)
    fillet3_piece_16 = split(fillet3_piece_16, bisect_by=Plane(origin=(-12.675014868, 107.480802197, 6.55), z_dir=(1, 0, 0)), keep=Keep.TOP, mode=Mode.PRIVATE)
    add(fillet3_piece_16)

    # Fillet4
    fillet4_edges = [cut_extrude1_piece_1_3.edges().sort_by_distance(p)[0] for p in [
        (73.024985132, 105.023992794, 4.05),
        (73.024985132, 153.354295574, 4.05),
        (-16.875014868, 153.354295574, 4.05),
        (-16.875014868, 105.023992794, 4.05),
    ]]
    fillet(fillet4_edges, radius=FILLET4_R)

    # Sketch25 → Boss-Extrude21 (add)
    with BuildSketch(Plane.XZ.offset(-126.689144184)):
        with Locations((28.074985132, 6.75)):
            Rectangle(SKETCH25_W, SKETCH25_H)
    extrude(amount=BOSS_EXTRUDE21_DEPTH)

    # Sketch26 → Boss-Extrude22 (add)
    with BuildSketch(Plane(origin=(0, 131.689144184, 0), x_dir=(-1, 0, 0), z_dir=(0, 1, 0))):
        with Locations((-28.074985132, 6.75)):
            Rectangle(SKETCH26_W, SKETCH26_H)
    extrude(amount=BOSS_EXTRUDE22_DEPTH)

    # Fillet5
    fillet5_edges = [cut_extrude1_piece_1_3.edges().sort_by_distance(p)[0] for p in [
        (58.824985132, 279.189144184, 6.55),
        (-2.675014868, 279.189144184, 6.55),
        (-2.675014868, 123.689144184, 6.75),
        (58.824985132, 123.689144184, 6.75),
        (58.824985132, 134.689144184, 6.75),
        (-2.675014868, 134.689144184, 6.75),
        (-2.675014868, -20.810855816, 6.55),
        (58.824985132, -20.810855816, 6.55),
    ]]
    fillet(fillet5_edges, radius=FILLET5_R)


with BuildPart() as body_2_2:
    # Split2: the piece on the far side of the plane
    add(cut_extrude1_piece_1_3.part)
    split(bisect_by=Plane(origin=(0, 129.189144184, 0), x_dir=(0, 0, -1), z_dir=(0, -1, 0)), keep=Keep.BOTTOM)


with BuildPart() as cut_extrude1_piece_1_4:
    add(cut_extrude1_piece_1_3.part)

    # Split2
    split(bisect_by=Plane(origin=(0, 129.189144184, 0), x_dir=(0, 0, -1), z_dir=(0, -1, 0)), keep=Keep.TOP)


solid = Compound([body_2_2.part, cut_extrude1_piece_1_4.part])
